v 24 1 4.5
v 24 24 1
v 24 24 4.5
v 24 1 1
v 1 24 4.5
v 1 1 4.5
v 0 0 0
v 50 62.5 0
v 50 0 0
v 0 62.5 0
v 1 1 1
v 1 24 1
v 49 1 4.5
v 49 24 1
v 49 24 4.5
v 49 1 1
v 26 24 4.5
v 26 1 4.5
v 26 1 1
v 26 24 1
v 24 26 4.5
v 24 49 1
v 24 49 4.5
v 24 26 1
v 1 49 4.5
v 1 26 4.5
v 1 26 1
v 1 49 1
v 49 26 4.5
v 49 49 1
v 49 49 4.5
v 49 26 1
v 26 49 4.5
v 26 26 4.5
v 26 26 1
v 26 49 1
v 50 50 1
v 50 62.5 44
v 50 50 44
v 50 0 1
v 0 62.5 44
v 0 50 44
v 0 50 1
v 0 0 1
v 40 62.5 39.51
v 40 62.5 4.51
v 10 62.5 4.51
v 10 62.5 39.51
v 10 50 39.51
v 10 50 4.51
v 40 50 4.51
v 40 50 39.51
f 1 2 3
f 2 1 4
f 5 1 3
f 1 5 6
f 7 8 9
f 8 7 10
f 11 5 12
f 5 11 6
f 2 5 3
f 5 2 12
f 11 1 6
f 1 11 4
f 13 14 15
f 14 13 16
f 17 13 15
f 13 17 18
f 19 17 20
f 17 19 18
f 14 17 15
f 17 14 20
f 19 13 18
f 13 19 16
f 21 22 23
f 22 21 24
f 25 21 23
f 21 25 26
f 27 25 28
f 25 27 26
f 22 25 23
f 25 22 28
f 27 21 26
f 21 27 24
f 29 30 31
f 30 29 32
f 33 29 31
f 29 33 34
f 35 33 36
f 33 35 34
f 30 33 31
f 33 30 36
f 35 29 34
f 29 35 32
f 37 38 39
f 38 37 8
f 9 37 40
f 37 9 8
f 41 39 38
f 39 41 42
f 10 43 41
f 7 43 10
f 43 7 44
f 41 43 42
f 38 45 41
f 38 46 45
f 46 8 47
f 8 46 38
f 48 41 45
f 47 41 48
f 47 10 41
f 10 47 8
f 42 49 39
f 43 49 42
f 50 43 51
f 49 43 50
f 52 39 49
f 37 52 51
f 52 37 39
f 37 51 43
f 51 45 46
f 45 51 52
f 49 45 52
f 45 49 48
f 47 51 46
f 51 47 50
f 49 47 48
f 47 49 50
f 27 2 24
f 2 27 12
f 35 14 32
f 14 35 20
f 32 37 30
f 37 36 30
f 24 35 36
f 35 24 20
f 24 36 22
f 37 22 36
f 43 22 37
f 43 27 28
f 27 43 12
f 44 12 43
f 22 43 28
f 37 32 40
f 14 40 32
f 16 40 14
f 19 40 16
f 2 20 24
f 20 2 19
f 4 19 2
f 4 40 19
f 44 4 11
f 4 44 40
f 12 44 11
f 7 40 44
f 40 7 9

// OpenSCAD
color("LightGray") {
    translate([1,1,0]) cube([23,23,4.5]);
    translate([25+1,1,0]) cube([23,23,4.5]);
    translate([1,25+1,0]) cube([23,23,4.5]);
    translate([25+1,25+1,0]) cube([23,23,4.5]);
}
color("Grey") {
    cube([50,50,1]);
    difference() {
        translate([0,50,0]) cube([50,12.5,50-6]);
        translate([10,25,4.51]) cube([30,50,35]);
    }
}
